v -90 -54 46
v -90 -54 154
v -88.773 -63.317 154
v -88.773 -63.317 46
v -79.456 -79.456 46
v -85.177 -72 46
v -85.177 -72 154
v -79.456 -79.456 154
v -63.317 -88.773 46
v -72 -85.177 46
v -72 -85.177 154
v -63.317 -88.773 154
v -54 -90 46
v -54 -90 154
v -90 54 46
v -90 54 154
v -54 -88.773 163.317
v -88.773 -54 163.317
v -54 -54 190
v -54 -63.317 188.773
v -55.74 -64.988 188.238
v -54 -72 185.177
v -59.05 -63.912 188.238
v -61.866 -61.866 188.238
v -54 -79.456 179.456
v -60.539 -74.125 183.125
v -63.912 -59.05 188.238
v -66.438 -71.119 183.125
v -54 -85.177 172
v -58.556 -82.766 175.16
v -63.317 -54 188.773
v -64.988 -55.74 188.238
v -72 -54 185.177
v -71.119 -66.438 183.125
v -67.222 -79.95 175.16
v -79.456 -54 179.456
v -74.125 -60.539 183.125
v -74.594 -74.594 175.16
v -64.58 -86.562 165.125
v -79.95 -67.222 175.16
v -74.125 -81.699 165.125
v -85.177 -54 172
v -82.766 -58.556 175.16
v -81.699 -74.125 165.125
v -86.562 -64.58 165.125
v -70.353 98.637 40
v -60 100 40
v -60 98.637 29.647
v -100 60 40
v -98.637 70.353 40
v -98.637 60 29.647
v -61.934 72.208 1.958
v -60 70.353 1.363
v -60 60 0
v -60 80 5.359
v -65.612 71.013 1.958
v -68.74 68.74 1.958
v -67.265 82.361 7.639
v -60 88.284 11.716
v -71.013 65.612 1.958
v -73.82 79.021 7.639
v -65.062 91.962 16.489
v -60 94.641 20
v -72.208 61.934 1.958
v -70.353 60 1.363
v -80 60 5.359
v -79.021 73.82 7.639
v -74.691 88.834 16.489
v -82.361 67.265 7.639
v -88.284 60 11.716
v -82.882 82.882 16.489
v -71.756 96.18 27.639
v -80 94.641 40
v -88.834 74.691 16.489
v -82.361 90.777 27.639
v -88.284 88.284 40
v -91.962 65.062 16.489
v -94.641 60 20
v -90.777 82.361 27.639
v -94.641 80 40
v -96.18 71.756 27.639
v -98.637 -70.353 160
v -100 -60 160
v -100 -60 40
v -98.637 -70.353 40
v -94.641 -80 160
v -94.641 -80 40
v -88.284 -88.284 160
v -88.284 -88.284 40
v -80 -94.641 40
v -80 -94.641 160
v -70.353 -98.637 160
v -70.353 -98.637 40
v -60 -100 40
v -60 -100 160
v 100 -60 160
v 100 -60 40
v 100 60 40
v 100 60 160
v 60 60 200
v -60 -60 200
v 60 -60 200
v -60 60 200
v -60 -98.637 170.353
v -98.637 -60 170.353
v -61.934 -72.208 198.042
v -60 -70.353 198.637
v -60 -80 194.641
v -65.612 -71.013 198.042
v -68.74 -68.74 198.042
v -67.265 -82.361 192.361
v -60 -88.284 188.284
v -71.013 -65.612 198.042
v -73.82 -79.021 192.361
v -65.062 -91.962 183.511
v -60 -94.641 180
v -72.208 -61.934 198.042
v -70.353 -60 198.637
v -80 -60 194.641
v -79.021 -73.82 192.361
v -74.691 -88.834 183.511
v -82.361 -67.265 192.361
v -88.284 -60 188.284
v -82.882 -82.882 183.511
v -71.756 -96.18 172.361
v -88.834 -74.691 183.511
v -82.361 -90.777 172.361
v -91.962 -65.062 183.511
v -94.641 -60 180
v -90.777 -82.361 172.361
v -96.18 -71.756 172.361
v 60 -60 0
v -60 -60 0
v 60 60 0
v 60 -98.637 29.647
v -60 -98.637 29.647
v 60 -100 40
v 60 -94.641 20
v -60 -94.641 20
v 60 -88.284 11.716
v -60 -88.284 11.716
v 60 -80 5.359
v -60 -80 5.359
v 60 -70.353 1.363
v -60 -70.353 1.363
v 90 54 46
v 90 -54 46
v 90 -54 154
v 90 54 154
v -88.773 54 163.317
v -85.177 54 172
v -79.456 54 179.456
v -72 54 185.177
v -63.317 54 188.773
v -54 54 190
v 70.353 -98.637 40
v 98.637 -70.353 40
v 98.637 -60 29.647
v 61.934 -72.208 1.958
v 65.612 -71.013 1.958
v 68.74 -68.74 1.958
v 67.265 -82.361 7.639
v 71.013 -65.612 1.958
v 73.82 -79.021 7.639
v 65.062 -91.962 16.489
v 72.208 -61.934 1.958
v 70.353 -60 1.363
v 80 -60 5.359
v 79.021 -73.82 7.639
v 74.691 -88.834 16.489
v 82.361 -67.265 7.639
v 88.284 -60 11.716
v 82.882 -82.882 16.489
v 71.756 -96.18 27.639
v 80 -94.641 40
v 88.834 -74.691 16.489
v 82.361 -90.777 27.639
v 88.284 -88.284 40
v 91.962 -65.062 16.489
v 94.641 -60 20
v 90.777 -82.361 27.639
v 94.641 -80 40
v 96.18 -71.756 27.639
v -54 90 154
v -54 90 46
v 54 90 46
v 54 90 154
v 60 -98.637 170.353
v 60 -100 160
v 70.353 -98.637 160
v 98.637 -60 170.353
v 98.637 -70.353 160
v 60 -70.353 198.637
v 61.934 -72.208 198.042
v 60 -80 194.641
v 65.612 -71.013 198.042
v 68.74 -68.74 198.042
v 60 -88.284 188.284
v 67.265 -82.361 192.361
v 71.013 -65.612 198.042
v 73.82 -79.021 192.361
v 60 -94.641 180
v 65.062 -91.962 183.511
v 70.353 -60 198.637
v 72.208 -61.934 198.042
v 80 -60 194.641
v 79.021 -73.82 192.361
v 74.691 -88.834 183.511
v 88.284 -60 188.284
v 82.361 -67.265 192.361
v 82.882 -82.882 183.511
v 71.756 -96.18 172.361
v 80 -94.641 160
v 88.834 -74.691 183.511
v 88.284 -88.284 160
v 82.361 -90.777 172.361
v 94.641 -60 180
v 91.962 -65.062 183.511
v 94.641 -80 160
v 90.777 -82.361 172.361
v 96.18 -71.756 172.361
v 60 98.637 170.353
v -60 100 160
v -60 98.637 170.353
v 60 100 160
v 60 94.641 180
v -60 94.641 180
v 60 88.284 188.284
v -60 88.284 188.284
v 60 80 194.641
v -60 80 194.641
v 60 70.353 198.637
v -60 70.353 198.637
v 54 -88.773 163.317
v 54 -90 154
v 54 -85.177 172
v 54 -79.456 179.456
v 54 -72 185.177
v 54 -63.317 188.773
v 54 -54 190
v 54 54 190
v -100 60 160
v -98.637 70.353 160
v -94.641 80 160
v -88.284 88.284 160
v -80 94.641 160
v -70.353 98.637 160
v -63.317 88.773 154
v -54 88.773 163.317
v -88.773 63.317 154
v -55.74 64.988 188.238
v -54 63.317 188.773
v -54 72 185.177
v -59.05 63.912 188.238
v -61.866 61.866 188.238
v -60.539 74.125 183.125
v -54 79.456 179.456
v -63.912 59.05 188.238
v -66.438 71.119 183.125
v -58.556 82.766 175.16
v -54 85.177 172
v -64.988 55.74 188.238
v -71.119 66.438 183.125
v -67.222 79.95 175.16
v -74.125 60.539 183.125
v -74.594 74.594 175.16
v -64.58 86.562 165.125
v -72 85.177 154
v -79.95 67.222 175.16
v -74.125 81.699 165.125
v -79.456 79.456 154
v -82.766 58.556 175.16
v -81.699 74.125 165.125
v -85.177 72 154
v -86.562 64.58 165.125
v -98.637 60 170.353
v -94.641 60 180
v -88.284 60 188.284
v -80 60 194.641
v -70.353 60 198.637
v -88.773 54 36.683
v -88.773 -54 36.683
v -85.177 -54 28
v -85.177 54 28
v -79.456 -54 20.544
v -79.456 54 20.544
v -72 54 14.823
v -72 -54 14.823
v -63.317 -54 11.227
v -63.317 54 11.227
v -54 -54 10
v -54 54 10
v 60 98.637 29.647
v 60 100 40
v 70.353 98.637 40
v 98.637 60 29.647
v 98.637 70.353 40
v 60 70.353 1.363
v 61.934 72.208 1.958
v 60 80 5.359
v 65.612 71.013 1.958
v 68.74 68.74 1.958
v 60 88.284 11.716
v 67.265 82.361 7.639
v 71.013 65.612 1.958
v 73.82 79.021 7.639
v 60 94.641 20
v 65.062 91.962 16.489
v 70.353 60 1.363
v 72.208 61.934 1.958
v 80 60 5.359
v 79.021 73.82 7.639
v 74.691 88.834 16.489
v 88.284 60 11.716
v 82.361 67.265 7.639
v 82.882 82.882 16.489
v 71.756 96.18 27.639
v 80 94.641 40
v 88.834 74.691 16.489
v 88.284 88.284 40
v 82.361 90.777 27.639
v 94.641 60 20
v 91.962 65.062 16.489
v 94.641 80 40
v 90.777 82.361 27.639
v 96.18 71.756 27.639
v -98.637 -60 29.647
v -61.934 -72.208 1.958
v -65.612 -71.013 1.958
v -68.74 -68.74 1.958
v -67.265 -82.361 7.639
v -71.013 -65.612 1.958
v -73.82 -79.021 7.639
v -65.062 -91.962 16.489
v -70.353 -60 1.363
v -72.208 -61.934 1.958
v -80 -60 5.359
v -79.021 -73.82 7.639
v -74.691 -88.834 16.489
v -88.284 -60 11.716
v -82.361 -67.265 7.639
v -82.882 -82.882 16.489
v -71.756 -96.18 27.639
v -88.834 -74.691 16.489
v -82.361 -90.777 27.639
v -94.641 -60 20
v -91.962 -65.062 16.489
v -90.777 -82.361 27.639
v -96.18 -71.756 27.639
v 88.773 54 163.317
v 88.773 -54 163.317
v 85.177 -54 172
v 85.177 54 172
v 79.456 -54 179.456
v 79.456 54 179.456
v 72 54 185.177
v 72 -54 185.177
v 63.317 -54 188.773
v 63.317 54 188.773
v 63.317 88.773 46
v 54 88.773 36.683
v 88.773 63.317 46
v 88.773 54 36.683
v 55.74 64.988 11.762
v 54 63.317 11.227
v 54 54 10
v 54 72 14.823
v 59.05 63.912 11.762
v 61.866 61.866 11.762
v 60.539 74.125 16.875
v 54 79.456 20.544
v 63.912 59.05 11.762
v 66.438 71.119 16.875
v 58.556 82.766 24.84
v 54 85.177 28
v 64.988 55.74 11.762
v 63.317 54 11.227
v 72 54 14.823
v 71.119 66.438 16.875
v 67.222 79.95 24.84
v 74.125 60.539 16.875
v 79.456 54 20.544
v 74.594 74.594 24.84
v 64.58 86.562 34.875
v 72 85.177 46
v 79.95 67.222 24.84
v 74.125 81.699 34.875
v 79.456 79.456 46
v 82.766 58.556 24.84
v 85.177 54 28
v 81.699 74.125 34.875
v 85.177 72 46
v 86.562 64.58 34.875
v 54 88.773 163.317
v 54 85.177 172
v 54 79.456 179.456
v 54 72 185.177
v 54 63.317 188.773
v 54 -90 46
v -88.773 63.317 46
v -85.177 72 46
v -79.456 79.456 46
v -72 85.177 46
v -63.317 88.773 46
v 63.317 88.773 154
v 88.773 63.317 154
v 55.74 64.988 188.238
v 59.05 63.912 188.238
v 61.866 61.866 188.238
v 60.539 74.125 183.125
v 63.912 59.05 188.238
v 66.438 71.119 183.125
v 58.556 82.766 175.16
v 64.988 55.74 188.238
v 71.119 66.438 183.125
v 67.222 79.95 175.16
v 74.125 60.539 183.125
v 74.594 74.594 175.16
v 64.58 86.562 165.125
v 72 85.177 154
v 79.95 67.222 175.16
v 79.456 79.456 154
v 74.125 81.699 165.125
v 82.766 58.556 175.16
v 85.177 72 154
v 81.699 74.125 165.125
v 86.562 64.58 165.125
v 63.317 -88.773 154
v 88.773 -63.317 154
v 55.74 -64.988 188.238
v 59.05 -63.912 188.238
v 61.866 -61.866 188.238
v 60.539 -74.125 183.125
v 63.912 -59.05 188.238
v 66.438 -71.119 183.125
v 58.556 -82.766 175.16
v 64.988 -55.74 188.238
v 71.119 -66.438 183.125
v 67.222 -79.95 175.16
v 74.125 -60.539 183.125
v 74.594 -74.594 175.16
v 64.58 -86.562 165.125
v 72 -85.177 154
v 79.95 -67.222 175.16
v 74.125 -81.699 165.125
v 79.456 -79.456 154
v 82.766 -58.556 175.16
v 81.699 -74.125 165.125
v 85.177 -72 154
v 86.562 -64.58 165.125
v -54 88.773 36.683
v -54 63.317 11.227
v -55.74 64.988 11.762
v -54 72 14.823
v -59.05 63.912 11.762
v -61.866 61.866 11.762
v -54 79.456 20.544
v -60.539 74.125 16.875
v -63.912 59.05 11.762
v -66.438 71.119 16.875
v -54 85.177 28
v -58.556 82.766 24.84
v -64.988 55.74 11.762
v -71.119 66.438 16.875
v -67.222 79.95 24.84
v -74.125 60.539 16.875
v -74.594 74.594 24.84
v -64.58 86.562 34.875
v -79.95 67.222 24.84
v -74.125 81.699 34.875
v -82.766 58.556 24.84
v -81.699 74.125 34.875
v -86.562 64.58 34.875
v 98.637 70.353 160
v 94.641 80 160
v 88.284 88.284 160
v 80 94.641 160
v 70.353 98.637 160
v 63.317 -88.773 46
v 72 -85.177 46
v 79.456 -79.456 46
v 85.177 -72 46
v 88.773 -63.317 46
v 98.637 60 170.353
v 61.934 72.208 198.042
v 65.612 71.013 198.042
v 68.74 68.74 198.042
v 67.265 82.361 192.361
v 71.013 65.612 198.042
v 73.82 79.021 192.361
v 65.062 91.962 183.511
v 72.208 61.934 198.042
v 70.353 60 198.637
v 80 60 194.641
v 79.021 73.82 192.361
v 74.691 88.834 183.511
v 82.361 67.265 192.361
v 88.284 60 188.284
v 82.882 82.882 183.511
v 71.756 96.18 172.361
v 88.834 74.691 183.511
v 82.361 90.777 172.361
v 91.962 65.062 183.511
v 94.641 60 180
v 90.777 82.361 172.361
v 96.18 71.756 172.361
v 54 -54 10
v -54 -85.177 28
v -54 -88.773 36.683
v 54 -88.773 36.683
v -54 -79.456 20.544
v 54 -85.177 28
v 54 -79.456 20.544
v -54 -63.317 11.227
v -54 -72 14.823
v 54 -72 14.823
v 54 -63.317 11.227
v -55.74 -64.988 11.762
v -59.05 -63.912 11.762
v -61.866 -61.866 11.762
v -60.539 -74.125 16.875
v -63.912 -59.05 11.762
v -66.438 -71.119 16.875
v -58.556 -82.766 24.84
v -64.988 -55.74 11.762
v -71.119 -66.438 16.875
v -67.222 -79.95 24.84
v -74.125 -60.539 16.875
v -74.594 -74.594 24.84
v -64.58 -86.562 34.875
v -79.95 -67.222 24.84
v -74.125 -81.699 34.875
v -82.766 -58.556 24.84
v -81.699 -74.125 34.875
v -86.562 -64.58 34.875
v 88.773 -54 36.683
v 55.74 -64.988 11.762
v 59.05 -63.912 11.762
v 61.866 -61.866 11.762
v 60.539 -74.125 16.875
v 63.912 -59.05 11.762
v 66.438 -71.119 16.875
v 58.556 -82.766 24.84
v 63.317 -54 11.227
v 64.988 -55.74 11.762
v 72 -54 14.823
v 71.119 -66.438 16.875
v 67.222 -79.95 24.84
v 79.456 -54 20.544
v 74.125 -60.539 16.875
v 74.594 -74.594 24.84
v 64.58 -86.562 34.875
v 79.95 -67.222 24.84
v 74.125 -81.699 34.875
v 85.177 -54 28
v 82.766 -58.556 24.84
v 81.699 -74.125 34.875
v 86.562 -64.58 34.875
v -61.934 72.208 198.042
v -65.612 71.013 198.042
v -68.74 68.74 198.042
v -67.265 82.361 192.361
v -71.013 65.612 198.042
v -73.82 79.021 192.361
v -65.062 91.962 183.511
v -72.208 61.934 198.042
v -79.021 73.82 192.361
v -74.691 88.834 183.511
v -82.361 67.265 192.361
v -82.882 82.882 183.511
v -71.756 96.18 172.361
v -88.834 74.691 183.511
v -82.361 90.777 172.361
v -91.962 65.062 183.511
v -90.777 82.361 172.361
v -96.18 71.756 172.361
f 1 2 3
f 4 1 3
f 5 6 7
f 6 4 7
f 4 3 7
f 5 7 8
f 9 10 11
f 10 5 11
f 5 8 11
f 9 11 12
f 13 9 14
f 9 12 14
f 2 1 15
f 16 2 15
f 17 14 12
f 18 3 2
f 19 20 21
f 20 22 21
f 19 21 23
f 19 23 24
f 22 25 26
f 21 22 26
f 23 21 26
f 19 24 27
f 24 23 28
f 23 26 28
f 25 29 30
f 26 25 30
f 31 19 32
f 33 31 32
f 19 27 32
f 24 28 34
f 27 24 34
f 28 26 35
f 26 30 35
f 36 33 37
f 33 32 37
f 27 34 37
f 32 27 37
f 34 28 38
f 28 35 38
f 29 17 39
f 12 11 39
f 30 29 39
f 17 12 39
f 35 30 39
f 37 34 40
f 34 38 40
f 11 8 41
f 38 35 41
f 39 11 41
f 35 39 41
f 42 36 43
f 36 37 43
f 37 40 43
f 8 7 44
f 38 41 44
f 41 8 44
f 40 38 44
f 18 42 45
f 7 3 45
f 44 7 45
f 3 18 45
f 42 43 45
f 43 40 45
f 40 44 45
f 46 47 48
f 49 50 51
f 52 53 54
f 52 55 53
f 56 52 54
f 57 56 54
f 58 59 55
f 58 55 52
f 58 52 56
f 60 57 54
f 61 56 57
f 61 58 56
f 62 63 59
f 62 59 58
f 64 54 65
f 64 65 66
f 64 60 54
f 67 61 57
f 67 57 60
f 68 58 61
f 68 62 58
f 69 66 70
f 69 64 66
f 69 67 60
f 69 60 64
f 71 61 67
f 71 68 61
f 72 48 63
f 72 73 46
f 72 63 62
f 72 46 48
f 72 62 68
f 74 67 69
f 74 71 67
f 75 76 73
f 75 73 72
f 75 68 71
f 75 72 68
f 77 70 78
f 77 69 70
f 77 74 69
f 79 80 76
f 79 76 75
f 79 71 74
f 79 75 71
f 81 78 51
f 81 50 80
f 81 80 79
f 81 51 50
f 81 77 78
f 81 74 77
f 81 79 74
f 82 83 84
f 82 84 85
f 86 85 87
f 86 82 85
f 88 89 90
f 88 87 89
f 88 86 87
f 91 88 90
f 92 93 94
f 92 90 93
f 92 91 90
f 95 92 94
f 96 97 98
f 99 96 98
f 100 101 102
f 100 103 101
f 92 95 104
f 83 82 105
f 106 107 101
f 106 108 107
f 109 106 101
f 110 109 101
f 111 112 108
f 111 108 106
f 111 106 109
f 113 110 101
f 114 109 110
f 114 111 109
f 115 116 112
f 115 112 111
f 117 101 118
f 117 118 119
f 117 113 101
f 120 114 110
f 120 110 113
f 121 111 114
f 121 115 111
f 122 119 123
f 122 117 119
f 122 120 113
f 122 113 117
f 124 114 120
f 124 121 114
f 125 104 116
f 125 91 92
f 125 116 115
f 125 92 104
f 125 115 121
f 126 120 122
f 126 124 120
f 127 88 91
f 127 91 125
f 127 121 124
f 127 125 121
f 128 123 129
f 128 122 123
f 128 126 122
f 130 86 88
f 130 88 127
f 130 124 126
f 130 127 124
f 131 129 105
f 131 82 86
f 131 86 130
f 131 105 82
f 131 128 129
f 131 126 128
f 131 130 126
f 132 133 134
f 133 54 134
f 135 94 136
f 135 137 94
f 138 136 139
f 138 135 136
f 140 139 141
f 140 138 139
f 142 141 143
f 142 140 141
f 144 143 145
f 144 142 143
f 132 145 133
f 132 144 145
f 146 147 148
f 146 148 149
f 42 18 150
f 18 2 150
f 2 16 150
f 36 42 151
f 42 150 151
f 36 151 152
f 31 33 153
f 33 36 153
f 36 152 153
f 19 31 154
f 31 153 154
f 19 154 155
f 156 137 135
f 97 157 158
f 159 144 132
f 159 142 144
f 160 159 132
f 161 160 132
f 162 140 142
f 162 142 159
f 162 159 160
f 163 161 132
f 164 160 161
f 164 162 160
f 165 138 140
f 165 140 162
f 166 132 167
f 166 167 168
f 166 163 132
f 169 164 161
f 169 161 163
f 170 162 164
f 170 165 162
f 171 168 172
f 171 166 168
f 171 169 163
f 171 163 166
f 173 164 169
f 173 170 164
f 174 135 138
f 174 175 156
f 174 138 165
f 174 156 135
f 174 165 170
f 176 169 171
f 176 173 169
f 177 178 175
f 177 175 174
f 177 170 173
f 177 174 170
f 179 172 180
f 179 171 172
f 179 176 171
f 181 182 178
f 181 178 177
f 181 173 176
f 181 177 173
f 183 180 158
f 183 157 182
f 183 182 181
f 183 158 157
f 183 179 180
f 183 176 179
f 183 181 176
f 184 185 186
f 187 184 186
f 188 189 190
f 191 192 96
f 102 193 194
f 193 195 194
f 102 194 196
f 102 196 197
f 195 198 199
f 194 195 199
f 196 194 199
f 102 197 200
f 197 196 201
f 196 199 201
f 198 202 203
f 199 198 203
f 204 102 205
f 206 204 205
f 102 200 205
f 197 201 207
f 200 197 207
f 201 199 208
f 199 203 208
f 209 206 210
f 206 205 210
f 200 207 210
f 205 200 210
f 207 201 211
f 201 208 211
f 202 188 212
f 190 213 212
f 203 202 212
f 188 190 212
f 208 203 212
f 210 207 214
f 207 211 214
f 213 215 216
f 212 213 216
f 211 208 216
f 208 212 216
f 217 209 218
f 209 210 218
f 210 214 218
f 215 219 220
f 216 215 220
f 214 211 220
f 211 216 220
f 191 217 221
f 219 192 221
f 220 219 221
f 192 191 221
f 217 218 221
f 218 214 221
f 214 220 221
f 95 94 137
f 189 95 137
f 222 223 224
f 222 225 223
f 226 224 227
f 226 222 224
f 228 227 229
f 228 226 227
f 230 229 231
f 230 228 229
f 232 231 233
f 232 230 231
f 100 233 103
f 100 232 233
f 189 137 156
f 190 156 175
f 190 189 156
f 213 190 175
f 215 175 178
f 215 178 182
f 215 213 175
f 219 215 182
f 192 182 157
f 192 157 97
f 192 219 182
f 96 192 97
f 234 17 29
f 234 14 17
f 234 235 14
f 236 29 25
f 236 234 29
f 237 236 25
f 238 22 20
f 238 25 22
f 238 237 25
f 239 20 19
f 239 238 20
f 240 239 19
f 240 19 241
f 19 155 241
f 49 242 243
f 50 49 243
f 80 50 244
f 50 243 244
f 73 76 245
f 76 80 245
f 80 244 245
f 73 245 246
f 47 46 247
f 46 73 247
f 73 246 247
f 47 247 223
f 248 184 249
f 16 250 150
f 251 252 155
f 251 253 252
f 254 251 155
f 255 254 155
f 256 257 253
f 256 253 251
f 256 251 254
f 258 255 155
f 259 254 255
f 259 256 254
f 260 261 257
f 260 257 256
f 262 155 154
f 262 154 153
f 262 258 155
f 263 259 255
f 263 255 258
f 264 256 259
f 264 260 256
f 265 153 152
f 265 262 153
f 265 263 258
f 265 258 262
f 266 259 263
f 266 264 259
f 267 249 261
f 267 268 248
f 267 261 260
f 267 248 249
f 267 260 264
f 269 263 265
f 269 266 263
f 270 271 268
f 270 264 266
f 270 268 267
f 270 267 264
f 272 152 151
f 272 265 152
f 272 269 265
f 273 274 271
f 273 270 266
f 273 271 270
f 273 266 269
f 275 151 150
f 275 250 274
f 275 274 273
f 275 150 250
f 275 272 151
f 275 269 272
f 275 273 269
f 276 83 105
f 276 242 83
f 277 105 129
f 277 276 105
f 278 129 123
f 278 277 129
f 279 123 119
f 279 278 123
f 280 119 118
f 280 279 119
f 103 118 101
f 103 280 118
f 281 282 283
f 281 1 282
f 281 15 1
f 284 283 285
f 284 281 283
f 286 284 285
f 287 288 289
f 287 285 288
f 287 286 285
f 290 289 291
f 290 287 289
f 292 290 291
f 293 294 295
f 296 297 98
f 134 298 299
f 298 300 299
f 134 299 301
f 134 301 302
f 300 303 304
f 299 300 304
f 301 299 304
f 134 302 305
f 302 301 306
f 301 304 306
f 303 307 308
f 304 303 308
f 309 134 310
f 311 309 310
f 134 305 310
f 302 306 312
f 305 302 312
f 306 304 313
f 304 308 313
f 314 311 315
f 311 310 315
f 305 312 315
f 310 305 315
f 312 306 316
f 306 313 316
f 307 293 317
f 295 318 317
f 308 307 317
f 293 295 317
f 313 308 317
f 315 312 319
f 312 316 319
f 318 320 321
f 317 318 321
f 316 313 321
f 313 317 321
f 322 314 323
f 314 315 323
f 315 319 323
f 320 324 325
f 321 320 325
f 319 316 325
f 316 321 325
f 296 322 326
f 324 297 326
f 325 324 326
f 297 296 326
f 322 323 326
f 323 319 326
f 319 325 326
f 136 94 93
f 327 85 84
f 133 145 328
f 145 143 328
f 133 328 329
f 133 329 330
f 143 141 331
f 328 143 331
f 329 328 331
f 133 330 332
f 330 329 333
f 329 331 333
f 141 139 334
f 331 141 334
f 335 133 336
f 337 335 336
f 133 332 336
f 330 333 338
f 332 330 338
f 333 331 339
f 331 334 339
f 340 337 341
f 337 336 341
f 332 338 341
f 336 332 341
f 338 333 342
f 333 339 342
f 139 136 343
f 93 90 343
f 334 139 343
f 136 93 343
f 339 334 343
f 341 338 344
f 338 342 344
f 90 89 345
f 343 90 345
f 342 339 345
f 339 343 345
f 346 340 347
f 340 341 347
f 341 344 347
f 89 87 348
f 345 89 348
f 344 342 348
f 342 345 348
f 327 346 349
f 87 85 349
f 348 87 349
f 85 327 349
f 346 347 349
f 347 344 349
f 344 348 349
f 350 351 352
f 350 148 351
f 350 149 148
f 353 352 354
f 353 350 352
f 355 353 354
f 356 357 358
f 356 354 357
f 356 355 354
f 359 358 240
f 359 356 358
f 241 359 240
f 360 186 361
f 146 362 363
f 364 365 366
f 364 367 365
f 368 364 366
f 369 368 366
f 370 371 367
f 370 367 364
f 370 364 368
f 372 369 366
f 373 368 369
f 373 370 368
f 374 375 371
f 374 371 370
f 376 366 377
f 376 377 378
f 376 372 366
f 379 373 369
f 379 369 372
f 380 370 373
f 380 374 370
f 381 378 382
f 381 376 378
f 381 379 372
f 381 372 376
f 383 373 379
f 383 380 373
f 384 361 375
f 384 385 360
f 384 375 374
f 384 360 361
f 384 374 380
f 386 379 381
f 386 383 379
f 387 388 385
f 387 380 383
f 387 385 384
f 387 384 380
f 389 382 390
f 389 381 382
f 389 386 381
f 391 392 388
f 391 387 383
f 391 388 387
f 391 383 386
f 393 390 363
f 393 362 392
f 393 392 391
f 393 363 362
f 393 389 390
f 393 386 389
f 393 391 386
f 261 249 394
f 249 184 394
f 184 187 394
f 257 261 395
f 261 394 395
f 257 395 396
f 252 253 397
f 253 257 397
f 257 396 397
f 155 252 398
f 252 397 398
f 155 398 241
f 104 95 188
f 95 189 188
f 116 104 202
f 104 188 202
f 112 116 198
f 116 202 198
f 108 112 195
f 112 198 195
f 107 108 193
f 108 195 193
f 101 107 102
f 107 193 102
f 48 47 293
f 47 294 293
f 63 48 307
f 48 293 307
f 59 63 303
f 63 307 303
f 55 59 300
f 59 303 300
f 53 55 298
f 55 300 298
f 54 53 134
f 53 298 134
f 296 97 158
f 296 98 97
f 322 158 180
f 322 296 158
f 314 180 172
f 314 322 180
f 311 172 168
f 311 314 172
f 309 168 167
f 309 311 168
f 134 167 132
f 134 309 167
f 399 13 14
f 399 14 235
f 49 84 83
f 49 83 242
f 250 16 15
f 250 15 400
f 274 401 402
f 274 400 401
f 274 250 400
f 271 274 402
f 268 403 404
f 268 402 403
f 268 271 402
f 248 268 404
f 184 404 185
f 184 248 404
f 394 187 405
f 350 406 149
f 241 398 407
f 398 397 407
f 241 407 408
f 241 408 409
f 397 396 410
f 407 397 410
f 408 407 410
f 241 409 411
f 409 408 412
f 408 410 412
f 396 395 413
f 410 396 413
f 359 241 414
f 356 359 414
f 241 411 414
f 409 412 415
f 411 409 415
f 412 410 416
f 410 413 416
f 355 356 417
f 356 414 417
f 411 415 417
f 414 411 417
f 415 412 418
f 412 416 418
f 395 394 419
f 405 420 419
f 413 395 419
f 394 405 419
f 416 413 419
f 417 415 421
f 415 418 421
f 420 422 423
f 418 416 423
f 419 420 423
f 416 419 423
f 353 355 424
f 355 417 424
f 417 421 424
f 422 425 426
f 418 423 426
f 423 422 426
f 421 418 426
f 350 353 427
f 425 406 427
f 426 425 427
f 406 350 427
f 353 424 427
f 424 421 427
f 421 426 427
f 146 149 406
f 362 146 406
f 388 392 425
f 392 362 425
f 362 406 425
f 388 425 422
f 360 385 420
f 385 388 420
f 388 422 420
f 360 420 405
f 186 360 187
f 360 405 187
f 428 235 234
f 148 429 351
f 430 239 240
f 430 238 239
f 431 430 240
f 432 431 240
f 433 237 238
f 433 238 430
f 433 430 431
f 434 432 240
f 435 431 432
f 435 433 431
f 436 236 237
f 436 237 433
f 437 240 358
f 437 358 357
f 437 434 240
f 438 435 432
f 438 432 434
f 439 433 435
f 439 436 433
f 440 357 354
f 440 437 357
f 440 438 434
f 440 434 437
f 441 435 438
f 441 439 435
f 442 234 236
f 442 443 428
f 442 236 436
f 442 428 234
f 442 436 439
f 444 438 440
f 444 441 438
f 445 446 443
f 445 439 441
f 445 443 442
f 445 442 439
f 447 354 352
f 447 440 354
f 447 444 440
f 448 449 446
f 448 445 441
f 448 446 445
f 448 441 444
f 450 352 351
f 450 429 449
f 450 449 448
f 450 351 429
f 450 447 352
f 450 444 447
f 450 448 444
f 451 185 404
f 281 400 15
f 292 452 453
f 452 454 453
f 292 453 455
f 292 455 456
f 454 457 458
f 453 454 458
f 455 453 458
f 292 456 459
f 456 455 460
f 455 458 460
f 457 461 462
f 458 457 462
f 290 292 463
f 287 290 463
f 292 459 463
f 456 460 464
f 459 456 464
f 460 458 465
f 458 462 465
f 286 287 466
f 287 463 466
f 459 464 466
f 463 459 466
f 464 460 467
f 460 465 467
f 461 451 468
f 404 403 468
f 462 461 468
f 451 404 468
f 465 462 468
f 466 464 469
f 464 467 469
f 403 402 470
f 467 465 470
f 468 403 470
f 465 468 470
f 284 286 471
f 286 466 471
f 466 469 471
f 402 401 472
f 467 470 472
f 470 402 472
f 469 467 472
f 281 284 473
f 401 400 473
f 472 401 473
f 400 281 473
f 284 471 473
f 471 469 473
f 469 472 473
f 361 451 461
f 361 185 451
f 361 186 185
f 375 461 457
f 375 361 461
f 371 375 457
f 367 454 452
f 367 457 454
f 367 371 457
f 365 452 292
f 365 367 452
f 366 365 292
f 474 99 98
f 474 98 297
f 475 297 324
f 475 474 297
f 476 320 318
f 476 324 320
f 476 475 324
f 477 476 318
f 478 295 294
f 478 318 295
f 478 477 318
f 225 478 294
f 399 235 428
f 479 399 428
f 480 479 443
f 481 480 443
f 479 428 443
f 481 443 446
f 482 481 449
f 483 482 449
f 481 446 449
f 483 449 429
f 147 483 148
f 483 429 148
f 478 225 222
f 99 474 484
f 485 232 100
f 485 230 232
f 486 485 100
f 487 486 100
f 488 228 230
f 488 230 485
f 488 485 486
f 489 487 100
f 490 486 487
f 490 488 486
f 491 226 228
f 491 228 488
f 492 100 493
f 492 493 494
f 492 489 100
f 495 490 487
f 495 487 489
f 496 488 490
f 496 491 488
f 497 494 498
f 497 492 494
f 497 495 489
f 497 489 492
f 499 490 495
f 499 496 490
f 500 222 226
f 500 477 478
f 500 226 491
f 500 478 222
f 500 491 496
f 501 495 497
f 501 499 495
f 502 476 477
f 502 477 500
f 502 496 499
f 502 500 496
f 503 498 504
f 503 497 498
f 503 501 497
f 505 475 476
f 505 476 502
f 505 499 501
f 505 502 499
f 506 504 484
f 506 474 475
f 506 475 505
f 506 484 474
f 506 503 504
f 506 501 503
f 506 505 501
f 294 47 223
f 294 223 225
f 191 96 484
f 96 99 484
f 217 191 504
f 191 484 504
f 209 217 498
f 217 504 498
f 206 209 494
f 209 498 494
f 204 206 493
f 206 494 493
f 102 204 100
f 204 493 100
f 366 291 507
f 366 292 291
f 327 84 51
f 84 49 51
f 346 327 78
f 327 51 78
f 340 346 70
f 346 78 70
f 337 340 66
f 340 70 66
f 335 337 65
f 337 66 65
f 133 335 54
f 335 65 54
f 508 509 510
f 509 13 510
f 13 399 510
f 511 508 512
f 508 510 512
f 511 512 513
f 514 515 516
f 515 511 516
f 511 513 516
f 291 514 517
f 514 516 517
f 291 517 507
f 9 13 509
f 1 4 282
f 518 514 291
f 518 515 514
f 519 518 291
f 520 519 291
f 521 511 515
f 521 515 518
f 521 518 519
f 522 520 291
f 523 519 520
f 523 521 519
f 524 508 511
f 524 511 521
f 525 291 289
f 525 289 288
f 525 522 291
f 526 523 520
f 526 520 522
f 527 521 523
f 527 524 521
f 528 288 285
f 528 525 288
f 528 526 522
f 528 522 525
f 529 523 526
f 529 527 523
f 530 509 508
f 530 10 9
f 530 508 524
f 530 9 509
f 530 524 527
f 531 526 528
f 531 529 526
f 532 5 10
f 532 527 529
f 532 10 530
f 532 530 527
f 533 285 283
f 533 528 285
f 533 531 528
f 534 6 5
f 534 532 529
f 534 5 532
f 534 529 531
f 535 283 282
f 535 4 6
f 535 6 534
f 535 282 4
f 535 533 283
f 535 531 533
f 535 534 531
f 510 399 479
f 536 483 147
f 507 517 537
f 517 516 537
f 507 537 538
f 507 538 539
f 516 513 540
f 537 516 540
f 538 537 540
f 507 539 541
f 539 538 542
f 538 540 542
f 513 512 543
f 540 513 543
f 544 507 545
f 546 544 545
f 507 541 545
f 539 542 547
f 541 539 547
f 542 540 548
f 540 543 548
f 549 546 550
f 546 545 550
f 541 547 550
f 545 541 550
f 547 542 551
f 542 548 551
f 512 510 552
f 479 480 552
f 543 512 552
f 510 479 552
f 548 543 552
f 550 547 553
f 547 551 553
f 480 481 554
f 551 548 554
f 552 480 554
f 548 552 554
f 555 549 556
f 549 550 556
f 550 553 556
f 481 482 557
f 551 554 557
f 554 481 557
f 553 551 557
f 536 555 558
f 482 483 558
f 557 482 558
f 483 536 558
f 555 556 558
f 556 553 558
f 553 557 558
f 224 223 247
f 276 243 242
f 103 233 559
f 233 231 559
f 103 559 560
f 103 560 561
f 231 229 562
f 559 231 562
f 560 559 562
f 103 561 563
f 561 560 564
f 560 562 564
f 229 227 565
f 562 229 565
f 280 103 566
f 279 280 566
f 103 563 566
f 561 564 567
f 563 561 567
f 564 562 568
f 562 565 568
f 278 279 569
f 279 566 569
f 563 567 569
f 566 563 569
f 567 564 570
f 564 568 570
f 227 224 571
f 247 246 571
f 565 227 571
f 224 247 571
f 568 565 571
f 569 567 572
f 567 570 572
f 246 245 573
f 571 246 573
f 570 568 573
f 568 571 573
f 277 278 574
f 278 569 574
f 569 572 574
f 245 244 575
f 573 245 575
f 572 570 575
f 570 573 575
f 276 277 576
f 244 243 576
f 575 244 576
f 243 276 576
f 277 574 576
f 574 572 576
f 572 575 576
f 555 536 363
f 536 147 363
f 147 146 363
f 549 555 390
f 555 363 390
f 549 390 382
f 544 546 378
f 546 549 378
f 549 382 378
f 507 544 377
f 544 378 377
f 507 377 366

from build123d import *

# Parameters (mm, degrees)
F0_W     = 200
F0_H     = 200
F1_DEPTH = 200
F2_R     = 40
F3_SCALE = 0.9


with BuildPart() as f1:
    # F0 (on Top) → F1 (new body)
    with BuildSketch(Plane.XY):
        Rectangle(F0_W, F0_H)
    extrude(amount=F1_DEPTH)

    # F2
    f2_edges = [f1.edges().sort_by_distance(p)[0] for p in [
        (-100, -100, 100),
        (100, -100, 100),
        (0, -100, 0),
        (0, -100, 200),
        (100, 100, 100),
        (-100, 100, 100),
        (0, 100, 0),
        (0, 100, 200),
        (100, 0, 0),
        (-100, 0, 0),
        (100, 0, 200),
        (-100, 0, 200),
    ]]
    fillet(f2_edges, radius=F2_R)


with BuildPart() as f3_1:
    # F3: copy of F1
    add(f1.part.scale(F3_SCALE))


with BuildPart() as f3_1_1:
    # F4: moved
    add(f3_1.part.moved(Location((0, 0, 10))))


with BuildPart() as f1_1:
    add(f1.part)

    # F5: cut F3_1
    add(f3_1_1.part, mode=Mode.SUBTRACT)


solid = f1_1.part
